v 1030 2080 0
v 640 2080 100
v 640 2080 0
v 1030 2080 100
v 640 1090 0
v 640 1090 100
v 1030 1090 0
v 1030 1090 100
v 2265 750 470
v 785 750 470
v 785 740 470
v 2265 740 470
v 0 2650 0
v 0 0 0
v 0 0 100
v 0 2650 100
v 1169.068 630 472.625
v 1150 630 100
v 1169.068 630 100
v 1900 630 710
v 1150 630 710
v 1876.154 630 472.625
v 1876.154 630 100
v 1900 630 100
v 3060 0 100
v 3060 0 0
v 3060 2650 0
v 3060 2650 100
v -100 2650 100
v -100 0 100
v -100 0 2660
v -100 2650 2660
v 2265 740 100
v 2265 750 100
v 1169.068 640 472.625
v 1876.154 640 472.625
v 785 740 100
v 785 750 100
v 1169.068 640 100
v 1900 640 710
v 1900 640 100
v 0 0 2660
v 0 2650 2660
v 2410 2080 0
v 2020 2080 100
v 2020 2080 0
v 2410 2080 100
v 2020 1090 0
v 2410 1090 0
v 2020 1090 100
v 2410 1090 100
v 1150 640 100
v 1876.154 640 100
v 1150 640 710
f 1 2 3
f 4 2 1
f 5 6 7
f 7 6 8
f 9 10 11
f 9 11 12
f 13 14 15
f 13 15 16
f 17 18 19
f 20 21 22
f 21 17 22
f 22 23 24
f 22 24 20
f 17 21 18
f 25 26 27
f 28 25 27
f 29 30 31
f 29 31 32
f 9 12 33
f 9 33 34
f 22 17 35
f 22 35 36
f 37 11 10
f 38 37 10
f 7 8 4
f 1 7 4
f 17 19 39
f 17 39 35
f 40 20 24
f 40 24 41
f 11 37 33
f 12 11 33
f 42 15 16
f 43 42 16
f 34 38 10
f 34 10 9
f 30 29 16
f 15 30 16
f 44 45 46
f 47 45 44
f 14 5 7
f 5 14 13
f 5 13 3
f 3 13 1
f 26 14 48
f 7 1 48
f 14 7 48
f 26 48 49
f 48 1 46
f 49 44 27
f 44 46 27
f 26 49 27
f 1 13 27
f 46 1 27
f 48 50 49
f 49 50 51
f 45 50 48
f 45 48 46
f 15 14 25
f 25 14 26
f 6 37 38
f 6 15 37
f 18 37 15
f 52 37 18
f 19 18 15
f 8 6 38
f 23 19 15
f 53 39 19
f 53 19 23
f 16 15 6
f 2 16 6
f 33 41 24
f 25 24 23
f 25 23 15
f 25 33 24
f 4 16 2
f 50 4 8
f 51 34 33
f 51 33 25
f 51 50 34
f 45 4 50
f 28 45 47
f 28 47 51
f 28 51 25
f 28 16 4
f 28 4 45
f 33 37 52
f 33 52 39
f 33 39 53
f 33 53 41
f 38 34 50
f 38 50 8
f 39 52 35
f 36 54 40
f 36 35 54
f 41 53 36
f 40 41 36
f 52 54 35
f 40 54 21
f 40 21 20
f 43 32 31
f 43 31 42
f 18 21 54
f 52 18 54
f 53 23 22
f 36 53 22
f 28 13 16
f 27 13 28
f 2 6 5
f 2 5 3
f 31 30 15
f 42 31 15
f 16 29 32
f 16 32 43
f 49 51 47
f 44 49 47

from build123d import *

# Parameters (mm, degrees)
ESBO_O6_W                = 3060
ESBO_O6_H                = 2650
RESSALTO_EXTRUS_O2_DEPTH = 100
ESBO_O7_W                = 390
ESBO_O7_H                = 990
CORTE_EXTRUS_O1_DEPTH    = 749
ESBO_O8_W                = 100
ESBO_O8_H                = 2650
RESSALTO_EXTRUS_O3_DEPTH = 2560
ESBO_O14_W               = 1480
ESBO_O14_H               = 10
RESSALTO_EXTRUS_O6_DEPTH = 370
ESBO_O16_W               = 750
ESBO_O16_H               = 10
RESSALTO_EXTRUS_O7_DEPTH = 710
ESBO_O17_W               = 707.085719873
ESBO_O17_H               = 372.624570159
CORTE_EXTRUS_O3_DEPTH    = 70


with BuildPart() as part:
    # Esboço6 → Ressalto-extrusão2 (new body)
    with BuildSketch(Plane.XY):
        with Locations((1530, 1325)):
            Rectangle(ESBO_O6_W, ESBO_O6_H)
    extrude(amount=RESSALTO_EXTRUS_O2_DEPTH)

    # Esboço7 → Corte-extrusão1 (cut)
    with BuildSketch(Plane.XY.offset(100)):
        with Locations((2215, 1585)):
            Rectangle(ESBO_O7_W, ESBO_O7_H)
        with Locations((835, 1585)):
            Rectangle(ESBO_O7_W, ESBO_O7_H)
    extrude(amount=-CORTE_EXTRUS_O1_DEPTH, mode=Mode.SUBTRACT)

    # Esboço14 → Ressalto-extrusão6 (add)
    with BuildSketch(Plane.XY.offset(100)):
        with Locations((1525, 745)):
            Rectangle(ESBO_O14_W, ESBO_O14_H)
    extrude(amount=RESSALTO_EXTRUS_O6_DEPTH)

    # Esboço16 → Ressalto-extrusão7 (add)
    with BuildSketch(Plane.XY):
        with Locations((1525, 635)):
            Rectangle(ESBO_O16_W, ESBO_O16_H)
    extrude(amount=RESSALTO_EXTRUS_O7_DEPTH)

    # Esboço17 → Corte-extrusão3 (cut)
    with BuildSketch(Plane.XZ.offset(-630)):
        with Locations((1522.610842488, 286.31228508)):
            Rectangle(ESBO_O17_W, ESBO_O17_H)
    extrude(amount=-CORTE_EXTRUS_O3_DEPTH, mode=Mode.SUBTRACT)


with BuildPart() as body_2:
    # Esboço8 → Ressalto-extrusão3 (new body)
    with BuildSketch(Plane.XY.offset(100)):
        with Locations((-50, 1325)):
            Rectangle(ESBO_O8_W, ESBO_O8_H)
    extrude(amount=RESSALTO_EXTRUS_O3_DEPTH)


solid = Compound([part.part, body_2.part])
